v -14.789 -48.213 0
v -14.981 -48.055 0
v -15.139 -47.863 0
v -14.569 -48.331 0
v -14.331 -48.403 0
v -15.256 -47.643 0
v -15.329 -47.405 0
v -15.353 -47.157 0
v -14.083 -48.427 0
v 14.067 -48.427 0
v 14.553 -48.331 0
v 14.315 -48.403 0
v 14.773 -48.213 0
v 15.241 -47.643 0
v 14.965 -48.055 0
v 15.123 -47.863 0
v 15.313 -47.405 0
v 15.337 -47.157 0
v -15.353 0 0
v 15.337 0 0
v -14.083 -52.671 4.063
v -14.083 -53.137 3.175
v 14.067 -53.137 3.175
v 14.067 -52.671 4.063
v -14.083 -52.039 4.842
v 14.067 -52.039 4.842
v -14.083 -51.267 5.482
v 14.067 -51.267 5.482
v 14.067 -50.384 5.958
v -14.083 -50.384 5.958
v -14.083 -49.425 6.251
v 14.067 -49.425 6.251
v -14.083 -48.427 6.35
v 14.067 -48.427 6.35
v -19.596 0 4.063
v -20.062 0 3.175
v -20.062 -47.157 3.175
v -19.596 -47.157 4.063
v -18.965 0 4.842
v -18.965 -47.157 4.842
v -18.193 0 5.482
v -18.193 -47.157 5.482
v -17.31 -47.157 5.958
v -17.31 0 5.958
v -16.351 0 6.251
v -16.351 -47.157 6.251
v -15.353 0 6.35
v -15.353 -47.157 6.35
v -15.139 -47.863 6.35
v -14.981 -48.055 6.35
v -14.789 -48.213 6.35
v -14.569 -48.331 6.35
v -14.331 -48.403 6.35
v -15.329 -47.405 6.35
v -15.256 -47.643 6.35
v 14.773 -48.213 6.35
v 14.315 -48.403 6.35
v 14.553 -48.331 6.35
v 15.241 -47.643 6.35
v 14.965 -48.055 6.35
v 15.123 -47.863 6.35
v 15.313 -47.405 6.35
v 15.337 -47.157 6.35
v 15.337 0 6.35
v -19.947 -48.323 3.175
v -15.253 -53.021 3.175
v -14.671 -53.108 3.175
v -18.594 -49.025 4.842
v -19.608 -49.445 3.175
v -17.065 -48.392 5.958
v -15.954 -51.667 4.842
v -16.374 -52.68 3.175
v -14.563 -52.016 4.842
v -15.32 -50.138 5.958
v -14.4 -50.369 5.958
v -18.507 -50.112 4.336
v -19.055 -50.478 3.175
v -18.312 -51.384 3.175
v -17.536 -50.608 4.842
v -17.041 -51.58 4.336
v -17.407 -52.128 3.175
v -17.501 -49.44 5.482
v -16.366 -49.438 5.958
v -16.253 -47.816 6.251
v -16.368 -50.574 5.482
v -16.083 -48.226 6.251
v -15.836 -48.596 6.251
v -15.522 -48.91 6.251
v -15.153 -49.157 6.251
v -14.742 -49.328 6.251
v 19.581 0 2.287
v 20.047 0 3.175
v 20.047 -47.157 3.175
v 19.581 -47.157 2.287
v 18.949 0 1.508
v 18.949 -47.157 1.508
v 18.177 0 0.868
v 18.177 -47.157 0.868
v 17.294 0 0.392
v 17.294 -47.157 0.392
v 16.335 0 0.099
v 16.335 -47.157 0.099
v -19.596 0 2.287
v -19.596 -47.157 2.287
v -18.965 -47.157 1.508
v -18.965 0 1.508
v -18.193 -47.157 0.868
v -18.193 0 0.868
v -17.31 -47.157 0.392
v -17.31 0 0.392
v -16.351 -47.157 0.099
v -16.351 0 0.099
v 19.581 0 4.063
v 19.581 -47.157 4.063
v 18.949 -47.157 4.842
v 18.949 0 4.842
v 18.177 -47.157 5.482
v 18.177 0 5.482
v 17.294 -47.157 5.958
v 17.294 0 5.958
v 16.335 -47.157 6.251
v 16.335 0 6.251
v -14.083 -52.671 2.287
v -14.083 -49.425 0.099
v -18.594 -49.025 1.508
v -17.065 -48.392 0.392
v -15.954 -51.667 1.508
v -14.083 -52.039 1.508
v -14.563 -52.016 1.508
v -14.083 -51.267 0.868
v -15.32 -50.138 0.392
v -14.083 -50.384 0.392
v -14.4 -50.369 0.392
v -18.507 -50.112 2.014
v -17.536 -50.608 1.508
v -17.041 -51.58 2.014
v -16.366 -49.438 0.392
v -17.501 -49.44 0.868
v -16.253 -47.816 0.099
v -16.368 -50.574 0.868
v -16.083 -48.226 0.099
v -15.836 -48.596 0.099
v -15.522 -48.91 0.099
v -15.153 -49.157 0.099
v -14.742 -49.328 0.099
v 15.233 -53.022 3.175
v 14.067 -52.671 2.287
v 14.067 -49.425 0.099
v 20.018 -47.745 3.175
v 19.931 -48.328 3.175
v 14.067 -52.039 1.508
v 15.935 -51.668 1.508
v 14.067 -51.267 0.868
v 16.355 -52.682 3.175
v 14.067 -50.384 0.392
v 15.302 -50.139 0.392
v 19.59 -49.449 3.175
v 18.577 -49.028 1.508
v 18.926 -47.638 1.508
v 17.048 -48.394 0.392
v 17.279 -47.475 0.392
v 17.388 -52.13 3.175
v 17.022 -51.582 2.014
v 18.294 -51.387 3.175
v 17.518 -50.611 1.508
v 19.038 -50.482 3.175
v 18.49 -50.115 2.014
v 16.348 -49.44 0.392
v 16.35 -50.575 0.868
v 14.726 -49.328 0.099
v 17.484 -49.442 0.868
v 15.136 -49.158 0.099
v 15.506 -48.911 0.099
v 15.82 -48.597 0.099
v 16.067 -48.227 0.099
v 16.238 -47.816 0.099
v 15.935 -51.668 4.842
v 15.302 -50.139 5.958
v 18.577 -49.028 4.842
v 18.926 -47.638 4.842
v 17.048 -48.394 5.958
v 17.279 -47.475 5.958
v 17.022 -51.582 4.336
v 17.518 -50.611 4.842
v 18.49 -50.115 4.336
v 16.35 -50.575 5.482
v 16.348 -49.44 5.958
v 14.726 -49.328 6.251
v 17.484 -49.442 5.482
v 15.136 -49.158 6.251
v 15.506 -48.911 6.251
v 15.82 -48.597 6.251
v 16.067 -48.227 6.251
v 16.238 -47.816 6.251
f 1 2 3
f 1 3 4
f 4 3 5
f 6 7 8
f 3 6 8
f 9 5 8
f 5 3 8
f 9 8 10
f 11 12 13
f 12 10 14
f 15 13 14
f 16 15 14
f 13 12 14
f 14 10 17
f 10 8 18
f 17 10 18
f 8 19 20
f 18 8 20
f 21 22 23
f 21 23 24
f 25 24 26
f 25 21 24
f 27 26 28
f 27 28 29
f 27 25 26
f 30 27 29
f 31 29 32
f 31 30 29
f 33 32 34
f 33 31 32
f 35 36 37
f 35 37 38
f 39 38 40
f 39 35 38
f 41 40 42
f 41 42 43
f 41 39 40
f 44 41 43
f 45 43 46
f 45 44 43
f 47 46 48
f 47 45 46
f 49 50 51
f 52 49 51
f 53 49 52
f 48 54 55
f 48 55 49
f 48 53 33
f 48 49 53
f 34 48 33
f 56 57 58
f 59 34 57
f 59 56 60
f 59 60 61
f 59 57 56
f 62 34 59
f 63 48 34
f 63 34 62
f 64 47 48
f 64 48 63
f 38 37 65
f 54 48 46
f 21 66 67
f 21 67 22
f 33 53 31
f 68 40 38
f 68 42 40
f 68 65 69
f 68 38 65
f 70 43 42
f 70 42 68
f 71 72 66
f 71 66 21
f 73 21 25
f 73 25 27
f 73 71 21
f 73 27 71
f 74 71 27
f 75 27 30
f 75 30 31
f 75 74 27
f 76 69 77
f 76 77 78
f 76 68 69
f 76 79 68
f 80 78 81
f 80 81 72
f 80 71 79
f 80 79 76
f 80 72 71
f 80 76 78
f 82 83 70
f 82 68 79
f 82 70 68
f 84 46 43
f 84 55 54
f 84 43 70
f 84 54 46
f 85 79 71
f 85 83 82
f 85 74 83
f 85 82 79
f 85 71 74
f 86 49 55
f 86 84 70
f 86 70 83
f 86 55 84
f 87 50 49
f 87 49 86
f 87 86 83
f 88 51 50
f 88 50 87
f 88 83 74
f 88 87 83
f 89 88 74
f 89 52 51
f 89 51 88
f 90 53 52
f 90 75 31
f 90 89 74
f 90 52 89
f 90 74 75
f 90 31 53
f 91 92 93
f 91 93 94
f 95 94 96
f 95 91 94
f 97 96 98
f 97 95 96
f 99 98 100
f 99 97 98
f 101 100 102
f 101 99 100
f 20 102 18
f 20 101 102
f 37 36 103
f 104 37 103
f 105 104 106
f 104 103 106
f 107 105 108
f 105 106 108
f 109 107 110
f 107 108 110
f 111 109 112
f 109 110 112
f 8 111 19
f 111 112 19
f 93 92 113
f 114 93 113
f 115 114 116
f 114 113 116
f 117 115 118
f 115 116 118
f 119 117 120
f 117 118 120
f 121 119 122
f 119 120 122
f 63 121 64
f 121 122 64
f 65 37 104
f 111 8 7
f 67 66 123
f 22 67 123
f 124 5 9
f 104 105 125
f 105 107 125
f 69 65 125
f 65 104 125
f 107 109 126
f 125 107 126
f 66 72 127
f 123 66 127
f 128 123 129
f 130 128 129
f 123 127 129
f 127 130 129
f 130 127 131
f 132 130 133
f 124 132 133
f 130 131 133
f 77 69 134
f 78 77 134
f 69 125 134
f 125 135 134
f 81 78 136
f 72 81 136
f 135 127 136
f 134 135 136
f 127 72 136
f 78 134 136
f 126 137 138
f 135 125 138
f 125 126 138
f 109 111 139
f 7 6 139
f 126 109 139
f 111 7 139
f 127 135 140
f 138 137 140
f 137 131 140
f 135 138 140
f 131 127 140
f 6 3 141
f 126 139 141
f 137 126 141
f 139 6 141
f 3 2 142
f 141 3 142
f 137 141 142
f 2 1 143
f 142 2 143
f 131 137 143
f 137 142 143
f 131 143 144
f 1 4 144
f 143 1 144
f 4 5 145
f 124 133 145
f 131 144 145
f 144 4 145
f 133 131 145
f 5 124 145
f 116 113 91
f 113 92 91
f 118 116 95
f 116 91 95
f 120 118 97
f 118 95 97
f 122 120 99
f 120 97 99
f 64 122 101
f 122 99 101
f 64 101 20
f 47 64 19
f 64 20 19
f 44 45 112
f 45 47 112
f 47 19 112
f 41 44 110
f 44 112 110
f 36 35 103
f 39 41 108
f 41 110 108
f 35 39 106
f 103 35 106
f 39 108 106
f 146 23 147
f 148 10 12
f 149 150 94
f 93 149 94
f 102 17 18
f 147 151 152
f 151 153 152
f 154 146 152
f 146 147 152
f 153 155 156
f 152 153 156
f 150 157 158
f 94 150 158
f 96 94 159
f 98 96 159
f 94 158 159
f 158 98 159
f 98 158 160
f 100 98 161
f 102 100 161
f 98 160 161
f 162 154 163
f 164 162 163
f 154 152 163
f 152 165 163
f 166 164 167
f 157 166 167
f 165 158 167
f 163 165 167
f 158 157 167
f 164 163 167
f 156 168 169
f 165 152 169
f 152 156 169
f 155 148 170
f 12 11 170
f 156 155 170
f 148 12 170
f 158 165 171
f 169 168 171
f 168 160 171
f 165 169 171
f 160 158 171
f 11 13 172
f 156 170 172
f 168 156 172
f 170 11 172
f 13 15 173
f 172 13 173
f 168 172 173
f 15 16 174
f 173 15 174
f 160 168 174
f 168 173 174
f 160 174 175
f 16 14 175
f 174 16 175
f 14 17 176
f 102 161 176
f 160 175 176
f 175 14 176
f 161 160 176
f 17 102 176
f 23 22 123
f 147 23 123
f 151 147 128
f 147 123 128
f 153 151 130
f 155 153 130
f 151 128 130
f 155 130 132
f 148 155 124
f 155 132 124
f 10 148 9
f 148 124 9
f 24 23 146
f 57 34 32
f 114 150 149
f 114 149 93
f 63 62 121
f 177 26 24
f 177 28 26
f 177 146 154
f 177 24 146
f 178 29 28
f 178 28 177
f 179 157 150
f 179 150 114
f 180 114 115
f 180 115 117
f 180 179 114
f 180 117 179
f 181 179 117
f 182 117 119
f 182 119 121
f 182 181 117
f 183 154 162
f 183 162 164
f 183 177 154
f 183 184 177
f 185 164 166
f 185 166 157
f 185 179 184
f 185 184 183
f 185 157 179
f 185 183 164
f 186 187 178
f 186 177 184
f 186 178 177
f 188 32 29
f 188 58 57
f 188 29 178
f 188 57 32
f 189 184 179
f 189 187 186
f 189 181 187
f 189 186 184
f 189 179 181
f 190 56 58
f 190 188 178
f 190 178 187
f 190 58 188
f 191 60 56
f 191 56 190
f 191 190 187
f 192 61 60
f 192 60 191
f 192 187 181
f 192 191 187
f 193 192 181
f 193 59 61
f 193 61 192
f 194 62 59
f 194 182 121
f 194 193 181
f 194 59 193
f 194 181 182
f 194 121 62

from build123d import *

# Parameters (mm, degrees)
F1_DEPTH     = 6.35
F2_T1_DEPTH  = 59.8574546933
F2_T3_DEPTH  = 28.1503971994
F2_T6_ANGLE  = 90
F2_T8_ANGLE  = 90
F2_T10_ANGLE = 90
F2_T12_ANGLE = 90


# Not quite as in the source:
# - a fillet or chamfer that OpenCascade refuses, or shapes differently, is made with other operations: its cross-section is extruded or revolved along the edge and cut away or added


with BuildPart() as f1:
    # F0 (on Top) → F1 (new body)
    with BuildSketch(Plane.XY):
        with BuildLine():
            Line((20.4174276441, 0), (-20.4329695553, 0))
            Line((-20.4329695553, 0), (-20.4329695553, -47.1574546933))
            ThreePointArc((-20.4329695553, -47.1574546933), (-18.5730976158, -51.6475827539), (-14.0829695553, -53.5074546933))
            Line((-14.0829695553, -53.5074546933), (14.0674276441, -53.5074546933))
            ThreePointArc((14.0674276441, -53.5074546933), (18.5575557047, -51.6475827539), (20.4174276441, -47.1574546933))
            Line((20.4174276441, -47.1574546933), (20.4174276441, 0))
        make_face()
    extrude(amount=F1_DEPTH)

    # F2: fillet of radius 5.08 on 10 edges, made by hand

    # F2_s2 → F2_t1 (cut)
    with BuildSketch(Plane.XZ.offset(-12.7)):
        with BuildLine():
            ThreePointArc((20.4174276441, 1.27), (18.9295300926, 4.8621024484), (15.3374276441, 6.35))
            Line((15.3374276441, 6.35), (20.4174276441, 6.35))
            Line((20.4174276441, 6.35), (20.4174276441, 1.27))
        make_face()
        with BuildLine():
            ThreePointArc((20.4174276441, 5.08), (18.9295300926, 1.4878975516), (15.3374276441, 0))
            Line((15.3374276441, 0), (20.4174276441, 0))
            Line((20.4174276441, 0), (20.4174276441, 5.08))
        make_face()
        with BuildLine():
            ThreePointArc((-20.4329695553, 1.27), (-18.9450720037, 4.8621024484), (-15.3529695553, 6.35))
            Line((-15.3529695553, 6.35), (-20.4329695553, 6.35))
            Line((-20.4329695553, 6.35), (-20.4329695553, 1.27))
        make_face()
        with BuildLine():
            ThreePointArc((-20.4329695553, 5.08), (-18.9450720037, 1.4878975516), (-15.3529695553, 0))
            Line((-15.3529695553, 0), (-20.4329695553, 0))
            Line((-20.4329695553, 0), (-20.4329695553, 5.08))
        make_face()
    extrude(amount=F2_T1_DEPTH, mode=Mode.SUBTRACT)

    # F2_s4 → F2_t3 (cut)
    with BuildSketch(Plane.YZ.offset(-14.0829695553)):
        with BuildLine():
            ThreePointArc((-53.5074546933, 5.08), (-52.0195571417, 1.4878975516), (-48.4274546933, 0))
            Line((-48.4274546933, 0), (-53.5074546933, 0))
            Line((-53.5074546933, 0), (-53.5074546933, 5.08))
        make_face()
        with BuildLine():
            ThreePointArc((-53.5074546933, 1.27), (-52.0195571417, 4.8621024484), (-48.4274546933, 6.35))
            Line((-48.4274546933, 6.35), (-53.5074546933, 6.35))
            Line((-53.5074546933, 6.35), (-53.5074546933, 1.27))
        make_face()
    extrude(amount=F2_T3_DEPTH, mode=Mode.SUBTRACT)

    # F2_s5 → F2_t6 (revolve, cut)
    with BuildSketch(Plane.YZ.offset(14.0674276441)):
        with BuildLine():
            ThreePointArc((-53.5074546933, 1.27), (-52.0195571417, 4.8621024484), (-48.4274546933, 6.35))
            Line((-48.4274546933, 6.35), (-53.5074546933, 6.35))
            Line((-53.5074546933, 6.35), (-53.5074546933, 1.27))
        make_face()
    revolve(axis=Axis((14.0674276441, -47.1574546933, 6.35), (0, 0, 1)), revolution_arc=F2_T6_ANGLE, mode=Mode.SUBTRACT)

    # F2_s7 → F2_t8 (revolve, cut)
    with BuildSketch(Plane.YZ.offset(14.0674276441)):
        with BuildLine():
            ThreePointArc((-53.5074546933, 5.08), (-52.0195571417, 1.4878975516), (-48.4274546933, 0))
            Line((-48.4274546933, 0), (-53.5074546933, 0))
            Line((-53.5074546933, 0), (-53.5074546933, 5.08))
        make_face()
    revolve(axis=Axis((14.0674276441, -47.1574546933, 0), (0, 0, 1)), revolution_arc=F2_T8_ANGLE, mode=Mode.SUBTRACT)

    # F2_s9 → F2_t10 (revolve, cut)
    with BuildSketch(Plane.XZ.offset(47.1574546933)):
        with BuildLine():
            ThreePointArc((-20.4329695553, 1.27), (-18.9450720037, 4.8621024484), (-15.3529695553, 6.35))
            Line((-15.3529695553, 6.35), (-20.4329695553, 6.35))
            Line((-20.4329695553, 6.35), (-20.4329695553, 1.27))
        make_face()
    revolve(axis=Axis((-14.0829695553, -47.1574546933, 6.35), (0, 0, 1)), revolution_arc=F2_T10_ANGLE, mode=Mode.SUBTRACT)

    # F2_s11 → F2_t12 (revolve, cut)
    with BuildSketch(Plane.XZ.offset(47.1574546933)):
        with BuildLine():
            ThreePointArc((-20.4329695553, 5.08), (-18.9450720037, 1.4878975516), (-15.3529695553, 0))
            Line((-15.3529695553, 0), (-20.4329695553, 0))
            Line((-20.4329695553, 0), (-20.4329695553, 5.08))
        make_face()
    revolve(axis=Axis((-14.0829695553, -47.1574546933, 0), (0, 0, 1)), revolution_arc=F2_T12_ANGLE, mode=Mode.SUBTRACT)


solid = f1.part
